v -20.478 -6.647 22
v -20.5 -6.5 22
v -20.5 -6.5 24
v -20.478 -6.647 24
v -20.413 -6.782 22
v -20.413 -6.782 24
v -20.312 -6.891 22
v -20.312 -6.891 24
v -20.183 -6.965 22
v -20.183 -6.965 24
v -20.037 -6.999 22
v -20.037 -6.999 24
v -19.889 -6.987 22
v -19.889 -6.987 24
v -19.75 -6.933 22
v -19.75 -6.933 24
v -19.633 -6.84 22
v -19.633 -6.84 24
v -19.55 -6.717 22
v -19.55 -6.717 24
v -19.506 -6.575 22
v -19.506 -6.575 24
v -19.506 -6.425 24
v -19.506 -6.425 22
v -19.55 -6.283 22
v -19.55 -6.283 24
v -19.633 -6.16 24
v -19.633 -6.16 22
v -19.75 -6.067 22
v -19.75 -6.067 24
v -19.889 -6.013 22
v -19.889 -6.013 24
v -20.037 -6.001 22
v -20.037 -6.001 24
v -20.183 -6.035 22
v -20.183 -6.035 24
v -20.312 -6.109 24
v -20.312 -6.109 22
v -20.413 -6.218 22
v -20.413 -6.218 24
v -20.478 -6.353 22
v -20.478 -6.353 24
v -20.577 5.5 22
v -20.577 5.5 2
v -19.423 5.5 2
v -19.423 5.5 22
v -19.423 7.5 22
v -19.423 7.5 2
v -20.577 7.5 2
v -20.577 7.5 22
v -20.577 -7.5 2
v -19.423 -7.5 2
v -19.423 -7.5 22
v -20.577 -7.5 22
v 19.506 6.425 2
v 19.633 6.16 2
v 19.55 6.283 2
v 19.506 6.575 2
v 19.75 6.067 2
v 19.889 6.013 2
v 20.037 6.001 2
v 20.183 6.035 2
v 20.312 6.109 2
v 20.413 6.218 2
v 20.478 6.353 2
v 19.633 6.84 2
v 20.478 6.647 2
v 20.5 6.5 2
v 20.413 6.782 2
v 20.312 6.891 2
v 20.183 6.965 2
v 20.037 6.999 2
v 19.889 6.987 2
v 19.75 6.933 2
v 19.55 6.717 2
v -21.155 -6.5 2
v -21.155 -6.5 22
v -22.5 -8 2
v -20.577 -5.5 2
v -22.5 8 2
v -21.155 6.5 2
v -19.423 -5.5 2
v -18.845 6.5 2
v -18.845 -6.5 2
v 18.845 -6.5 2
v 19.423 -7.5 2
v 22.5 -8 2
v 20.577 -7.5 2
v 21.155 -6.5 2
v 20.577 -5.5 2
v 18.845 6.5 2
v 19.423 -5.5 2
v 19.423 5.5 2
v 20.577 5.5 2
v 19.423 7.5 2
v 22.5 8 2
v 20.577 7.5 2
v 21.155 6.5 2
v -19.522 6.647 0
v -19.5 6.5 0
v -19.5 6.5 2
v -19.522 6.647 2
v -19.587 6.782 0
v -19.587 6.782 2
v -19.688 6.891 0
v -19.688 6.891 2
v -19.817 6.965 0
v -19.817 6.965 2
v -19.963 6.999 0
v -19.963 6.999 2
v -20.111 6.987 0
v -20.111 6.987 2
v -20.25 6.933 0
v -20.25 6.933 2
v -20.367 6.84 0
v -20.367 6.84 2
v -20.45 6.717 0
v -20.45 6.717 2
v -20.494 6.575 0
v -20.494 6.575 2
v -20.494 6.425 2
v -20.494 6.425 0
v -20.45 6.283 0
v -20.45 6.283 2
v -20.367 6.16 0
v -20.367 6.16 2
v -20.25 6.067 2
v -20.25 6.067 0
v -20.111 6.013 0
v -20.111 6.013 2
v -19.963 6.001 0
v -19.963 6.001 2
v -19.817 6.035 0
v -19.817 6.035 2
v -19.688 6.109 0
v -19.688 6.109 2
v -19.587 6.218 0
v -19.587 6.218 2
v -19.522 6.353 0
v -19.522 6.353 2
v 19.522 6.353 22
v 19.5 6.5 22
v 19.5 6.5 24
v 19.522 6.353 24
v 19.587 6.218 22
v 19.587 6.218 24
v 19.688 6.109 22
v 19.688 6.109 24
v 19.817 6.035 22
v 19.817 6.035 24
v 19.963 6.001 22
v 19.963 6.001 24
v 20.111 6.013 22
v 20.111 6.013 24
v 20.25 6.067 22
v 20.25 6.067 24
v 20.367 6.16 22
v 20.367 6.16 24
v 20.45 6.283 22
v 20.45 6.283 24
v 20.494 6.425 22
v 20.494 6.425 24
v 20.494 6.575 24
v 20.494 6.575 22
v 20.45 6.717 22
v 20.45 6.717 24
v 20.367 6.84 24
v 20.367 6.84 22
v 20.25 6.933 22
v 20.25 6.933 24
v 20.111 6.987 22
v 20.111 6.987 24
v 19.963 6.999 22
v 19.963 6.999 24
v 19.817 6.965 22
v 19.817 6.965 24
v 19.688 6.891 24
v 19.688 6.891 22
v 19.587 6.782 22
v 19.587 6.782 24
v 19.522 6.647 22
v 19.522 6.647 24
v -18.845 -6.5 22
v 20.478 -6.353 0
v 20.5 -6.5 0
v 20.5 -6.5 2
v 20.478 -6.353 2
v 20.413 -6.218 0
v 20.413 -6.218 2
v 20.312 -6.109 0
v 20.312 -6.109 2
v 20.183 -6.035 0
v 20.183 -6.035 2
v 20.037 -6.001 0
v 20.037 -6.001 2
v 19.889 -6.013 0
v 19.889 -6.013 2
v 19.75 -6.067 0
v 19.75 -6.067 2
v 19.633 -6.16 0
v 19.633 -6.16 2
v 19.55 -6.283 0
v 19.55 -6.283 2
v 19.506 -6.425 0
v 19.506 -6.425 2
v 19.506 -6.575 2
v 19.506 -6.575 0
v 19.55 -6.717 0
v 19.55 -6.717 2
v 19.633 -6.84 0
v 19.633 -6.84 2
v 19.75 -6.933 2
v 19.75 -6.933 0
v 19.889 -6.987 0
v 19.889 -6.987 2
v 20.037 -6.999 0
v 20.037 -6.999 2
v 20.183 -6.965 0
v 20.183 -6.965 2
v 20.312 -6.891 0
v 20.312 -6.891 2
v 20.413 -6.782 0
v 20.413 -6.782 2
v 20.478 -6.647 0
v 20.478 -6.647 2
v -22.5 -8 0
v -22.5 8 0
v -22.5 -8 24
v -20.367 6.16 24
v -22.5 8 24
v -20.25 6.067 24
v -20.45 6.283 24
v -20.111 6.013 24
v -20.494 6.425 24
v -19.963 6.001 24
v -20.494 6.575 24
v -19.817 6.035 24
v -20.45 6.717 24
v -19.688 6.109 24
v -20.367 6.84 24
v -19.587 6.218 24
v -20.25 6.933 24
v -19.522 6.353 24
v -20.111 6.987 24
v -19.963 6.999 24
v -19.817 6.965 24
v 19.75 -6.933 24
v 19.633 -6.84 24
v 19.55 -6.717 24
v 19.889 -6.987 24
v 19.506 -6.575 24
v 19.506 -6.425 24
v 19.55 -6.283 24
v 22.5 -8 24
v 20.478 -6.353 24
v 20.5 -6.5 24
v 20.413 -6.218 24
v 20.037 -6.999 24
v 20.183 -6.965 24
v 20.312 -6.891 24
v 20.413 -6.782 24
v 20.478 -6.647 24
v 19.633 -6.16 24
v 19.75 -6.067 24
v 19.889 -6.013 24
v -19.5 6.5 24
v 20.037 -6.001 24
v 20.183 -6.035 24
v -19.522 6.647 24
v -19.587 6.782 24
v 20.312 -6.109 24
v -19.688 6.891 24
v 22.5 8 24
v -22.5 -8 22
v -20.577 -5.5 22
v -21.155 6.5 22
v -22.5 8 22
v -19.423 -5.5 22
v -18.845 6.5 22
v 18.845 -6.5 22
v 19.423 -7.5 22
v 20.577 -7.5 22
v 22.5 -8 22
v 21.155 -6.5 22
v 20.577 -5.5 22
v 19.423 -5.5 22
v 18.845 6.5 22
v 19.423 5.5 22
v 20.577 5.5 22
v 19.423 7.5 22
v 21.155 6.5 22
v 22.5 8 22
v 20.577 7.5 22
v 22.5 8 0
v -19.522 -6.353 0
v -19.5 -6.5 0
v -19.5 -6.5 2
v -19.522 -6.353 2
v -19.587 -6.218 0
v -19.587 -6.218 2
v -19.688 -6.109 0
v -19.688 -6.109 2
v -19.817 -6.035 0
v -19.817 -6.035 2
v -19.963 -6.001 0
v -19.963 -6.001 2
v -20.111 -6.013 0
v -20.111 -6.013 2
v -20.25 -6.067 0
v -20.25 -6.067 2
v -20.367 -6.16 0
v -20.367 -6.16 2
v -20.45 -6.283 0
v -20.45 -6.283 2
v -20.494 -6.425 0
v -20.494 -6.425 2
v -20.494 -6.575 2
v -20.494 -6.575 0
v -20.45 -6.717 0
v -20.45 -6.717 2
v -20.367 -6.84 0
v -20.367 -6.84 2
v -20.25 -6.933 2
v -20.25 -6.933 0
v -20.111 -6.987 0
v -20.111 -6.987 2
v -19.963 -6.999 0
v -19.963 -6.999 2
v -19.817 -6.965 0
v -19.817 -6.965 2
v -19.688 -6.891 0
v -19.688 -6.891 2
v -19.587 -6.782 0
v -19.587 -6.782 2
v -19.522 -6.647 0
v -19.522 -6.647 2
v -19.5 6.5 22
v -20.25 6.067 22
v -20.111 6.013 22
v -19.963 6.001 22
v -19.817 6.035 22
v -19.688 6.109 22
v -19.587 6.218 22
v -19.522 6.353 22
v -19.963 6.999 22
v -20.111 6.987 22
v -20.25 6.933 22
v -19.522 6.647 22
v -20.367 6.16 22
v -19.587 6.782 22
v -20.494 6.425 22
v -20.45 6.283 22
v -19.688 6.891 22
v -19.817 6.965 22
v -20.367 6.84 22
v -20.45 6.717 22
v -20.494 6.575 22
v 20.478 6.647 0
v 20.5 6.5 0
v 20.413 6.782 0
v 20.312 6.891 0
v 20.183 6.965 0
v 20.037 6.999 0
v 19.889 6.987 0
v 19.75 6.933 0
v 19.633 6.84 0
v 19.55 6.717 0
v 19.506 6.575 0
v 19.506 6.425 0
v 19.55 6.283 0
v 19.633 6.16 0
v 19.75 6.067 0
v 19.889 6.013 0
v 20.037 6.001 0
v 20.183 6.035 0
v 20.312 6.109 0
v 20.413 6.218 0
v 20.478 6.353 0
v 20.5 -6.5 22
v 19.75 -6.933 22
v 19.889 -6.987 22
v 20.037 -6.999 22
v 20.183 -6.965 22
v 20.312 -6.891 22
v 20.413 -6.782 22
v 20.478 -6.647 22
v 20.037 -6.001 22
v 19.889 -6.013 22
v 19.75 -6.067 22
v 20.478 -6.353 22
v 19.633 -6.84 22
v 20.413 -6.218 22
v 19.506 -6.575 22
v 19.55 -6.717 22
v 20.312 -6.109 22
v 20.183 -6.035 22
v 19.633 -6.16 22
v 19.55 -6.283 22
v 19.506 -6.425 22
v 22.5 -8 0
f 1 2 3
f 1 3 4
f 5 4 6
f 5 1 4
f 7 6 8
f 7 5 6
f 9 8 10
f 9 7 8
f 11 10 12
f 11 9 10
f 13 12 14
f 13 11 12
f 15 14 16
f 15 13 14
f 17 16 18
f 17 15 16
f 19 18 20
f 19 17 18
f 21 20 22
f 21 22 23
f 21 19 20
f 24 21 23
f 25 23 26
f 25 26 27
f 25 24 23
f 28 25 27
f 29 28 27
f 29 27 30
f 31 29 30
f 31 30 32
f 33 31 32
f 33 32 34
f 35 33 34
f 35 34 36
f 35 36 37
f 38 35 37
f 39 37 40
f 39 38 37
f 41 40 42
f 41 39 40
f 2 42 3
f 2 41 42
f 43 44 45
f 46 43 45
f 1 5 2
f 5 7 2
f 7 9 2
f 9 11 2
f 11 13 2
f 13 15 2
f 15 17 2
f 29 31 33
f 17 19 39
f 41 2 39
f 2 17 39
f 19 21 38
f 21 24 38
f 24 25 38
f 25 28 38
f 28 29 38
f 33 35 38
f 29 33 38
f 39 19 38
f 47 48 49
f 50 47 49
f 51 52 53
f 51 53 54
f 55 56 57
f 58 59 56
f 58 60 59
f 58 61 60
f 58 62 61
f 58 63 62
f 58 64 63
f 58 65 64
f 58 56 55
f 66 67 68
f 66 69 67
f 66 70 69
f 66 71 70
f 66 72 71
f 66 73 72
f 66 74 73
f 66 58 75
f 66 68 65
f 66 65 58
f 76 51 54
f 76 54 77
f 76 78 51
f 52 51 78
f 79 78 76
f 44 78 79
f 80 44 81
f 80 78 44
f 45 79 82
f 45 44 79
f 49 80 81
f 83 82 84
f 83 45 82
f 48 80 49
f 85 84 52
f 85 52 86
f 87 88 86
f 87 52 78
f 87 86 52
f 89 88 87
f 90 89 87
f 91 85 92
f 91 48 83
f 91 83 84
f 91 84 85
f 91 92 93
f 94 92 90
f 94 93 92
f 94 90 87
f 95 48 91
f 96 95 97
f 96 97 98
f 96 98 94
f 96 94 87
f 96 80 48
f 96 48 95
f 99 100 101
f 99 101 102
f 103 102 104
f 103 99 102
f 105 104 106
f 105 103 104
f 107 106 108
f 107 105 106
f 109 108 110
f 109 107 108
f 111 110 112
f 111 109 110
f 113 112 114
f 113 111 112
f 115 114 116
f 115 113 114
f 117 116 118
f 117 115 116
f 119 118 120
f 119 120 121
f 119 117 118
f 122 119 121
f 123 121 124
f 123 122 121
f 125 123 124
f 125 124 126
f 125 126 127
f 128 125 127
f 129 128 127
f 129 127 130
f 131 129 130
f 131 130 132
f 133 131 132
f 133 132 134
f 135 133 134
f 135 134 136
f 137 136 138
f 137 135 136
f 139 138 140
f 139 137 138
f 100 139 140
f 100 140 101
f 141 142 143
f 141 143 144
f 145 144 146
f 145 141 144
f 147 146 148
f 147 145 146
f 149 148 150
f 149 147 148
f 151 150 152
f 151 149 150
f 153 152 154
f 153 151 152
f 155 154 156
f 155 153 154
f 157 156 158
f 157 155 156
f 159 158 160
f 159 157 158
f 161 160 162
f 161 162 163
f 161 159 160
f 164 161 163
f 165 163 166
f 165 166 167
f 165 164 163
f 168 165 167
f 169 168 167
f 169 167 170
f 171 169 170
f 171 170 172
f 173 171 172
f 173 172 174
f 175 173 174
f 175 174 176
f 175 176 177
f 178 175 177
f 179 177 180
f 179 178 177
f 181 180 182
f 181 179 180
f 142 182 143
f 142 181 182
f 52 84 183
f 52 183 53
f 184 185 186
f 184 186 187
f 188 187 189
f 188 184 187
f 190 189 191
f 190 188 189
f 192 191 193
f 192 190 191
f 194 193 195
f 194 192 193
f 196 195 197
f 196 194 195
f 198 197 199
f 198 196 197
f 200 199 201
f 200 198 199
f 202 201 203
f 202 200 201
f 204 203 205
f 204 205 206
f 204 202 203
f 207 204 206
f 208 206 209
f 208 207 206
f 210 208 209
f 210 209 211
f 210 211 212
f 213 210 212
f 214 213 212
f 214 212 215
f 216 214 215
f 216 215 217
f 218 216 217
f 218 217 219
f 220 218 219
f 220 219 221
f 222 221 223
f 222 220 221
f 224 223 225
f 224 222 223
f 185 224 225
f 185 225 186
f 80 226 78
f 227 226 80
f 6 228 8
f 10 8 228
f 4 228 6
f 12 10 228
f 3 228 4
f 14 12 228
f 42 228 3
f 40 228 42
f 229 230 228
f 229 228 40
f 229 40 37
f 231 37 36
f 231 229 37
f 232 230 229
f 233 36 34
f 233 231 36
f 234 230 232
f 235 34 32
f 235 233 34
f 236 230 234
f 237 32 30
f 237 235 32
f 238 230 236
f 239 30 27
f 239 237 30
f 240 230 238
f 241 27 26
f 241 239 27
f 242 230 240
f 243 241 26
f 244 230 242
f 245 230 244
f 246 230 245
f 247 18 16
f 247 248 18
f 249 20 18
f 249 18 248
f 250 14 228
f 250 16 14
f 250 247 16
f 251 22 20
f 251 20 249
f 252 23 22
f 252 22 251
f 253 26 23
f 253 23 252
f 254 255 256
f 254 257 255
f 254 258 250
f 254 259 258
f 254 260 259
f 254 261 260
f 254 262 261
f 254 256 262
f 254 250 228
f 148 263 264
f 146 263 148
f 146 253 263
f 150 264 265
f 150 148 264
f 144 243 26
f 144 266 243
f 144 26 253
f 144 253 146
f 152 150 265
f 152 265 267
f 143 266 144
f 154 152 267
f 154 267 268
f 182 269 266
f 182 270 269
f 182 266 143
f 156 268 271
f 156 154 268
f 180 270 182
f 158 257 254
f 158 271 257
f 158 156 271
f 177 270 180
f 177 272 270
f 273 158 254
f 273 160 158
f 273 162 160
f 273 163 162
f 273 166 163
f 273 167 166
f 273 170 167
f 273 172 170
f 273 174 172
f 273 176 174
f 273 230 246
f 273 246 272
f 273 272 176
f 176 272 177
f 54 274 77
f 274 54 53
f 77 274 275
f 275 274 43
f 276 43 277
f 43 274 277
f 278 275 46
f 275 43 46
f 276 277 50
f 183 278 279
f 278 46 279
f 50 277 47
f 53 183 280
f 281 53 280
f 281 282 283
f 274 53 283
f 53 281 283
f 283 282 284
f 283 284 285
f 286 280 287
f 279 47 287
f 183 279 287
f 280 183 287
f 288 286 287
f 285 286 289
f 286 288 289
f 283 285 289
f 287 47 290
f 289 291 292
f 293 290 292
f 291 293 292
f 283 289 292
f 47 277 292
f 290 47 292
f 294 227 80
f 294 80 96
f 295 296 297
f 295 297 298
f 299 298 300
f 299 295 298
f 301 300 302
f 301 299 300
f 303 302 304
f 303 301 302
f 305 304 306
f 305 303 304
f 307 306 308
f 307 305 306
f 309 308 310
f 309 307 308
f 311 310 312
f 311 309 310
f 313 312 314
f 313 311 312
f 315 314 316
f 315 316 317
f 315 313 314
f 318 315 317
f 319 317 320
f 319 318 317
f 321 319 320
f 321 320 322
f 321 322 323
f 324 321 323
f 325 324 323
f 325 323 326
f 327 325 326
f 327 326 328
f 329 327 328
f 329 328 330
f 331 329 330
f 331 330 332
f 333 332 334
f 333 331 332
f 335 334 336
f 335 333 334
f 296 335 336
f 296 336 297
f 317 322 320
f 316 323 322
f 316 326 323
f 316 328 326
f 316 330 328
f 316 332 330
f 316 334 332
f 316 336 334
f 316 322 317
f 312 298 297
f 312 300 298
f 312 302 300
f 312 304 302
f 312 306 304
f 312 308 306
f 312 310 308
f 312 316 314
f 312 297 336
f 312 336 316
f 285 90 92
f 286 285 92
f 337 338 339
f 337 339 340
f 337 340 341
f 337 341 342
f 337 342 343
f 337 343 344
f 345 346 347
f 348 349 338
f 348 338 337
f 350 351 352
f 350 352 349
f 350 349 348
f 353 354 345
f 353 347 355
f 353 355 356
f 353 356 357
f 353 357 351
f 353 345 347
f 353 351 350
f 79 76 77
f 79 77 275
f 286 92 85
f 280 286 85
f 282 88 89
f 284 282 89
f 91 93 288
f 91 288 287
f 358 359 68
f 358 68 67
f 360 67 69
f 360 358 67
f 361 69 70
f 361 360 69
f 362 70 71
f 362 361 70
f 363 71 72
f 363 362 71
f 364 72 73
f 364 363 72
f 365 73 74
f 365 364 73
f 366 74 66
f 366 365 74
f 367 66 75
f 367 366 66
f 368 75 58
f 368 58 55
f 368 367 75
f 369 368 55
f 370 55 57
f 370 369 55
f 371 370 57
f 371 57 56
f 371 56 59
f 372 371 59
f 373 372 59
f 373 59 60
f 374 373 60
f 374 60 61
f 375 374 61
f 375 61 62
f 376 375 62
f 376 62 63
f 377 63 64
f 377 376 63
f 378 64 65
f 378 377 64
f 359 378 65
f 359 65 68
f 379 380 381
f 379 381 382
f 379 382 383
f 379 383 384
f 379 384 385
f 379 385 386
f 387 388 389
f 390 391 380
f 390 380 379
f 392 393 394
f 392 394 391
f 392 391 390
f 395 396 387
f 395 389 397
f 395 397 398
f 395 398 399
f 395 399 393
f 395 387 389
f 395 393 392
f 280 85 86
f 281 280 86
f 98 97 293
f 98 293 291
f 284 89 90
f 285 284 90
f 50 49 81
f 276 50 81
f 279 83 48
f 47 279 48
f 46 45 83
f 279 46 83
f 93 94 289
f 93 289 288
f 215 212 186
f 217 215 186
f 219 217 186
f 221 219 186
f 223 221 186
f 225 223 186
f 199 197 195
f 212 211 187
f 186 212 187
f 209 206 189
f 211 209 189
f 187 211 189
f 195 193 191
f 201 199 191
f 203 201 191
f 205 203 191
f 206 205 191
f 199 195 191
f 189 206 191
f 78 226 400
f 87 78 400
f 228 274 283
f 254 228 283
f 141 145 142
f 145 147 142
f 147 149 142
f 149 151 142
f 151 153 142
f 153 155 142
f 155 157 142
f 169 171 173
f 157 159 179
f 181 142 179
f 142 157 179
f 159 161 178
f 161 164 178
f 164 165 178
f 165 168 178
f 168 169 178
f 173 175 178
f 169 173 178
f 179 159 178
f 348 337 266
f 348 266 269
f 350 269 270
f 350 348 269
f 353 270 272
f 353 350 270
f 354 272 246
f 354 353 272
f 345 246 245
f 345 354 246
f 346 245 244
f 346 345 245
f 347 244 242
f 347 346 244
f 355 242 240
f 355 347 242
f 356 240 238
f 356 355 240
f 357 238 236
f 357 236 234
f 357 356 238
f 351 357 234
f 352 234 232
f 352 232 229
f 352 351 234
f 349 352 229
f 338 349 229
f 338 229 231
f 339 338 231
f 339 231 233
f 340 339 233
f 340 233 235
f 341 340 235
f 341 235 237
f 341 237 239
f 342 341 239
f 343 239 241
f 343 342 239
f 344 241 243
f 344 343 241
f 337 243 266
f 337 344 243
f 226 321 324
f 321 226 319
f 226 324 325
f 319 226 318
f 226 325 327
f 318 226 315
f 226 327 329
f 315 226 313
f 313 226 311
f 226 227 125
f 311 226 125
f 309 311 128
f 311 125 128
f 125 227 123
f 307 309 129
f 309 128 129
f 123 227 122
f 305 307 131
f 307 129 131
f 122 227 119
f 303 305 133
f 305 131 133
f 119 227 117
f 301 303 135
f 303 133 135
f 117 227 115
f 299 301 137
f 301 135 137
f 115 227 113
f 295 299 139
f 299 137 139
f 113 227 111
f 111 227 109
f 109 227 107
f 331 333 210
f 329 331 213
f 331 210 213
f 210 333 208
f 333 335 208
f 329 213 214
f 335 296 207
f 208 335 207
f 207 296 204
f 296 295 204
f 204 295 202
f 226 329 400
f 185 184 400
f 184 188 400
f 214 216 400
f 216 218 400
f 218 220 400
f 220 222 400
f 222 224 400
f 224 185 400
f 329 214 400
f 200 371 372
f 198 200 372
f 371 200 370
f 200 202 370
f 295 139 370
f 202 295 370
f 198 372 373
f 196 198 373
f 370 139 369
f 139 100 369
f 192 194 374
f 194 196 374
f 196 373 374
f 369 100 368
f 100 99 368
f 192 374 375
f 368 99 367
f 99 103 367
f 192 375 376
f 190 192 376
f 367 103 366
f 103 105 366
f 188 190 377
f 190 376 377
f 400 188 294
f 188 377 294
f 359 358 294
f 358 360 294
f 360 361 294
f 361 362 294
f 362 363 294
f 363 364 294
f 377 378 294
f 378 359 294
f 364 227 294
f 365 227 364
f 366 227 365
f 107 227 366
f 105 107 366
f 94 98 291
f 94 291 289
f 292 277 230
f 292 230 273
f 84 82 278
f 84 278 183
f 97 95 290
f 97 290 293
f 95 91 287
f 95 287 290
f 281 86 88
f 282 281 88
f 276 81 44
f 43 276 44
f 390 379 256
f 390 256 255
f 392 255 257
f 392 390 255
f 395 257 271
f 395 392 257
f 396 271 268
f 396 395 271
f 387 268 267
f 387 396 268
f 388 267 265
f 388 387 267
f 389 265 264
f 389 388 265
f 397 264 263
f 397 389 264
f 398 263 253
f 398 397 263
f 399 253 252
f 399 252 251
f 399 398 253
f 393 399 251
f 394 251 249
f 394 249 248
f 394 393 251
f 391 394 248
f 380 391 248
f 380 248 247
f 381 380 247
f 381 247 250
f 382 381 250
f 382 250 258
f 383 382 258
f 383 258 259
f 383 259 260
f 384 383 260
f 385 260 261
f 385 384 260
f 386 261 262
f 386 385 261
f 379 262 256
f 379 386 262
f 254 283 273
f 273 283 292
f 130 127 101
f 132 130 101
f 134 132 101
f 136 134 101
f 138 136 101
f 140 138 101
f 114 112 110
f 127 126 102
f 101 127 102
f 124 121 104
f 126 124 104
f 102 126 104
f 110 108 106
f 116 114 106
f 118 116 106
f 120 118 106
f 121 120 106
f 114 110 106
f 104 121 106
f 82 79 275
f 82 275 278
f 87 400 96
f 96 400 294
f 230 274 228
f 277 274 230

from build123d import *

# Parameters (mm, degrees)
SKETCH_1_W      = 45
SKETCH_1_H      = 16
SKETCH_1_R      = 0.5
EXTRUDE_1_DEPTH = 2
EXTRUDE_2_DEPTH = 20
SKETCH_3_W      = 45
SKETCH_3_H      = 16
SKETCH_3_R      = 0.5
EXTRUDE_3_DEPTH = 2


with BuildPart() as part:
    # 草图1 → 凸台-拉伸1 (new body)
    with BuildSketch(Plane.XY):
        Rectangle(SKETCH_1_W, SKETCH_1_H)
        with Locations((-20, -6.5)):
            Circle(SKETCH_1_R, mode=Mode.SUBTRACT)
        with Locations((-20, 6.5)):
            Circle(SKETCH_1_R, mode=Mode.SUBTRACT)
        with Locations((20, 6.5)):
            Circle(SKETCH_1_R, mode=Mode.SUBTRACT)
        with Locations((20, -6.5)):
            Circle(SKETCH_1_R, mode=Mode.SUBTRACT)
    extrude(amount=EXTRUDE_1_DEPTH)

    # 草图2 → 凸台-拉伸2 (add)
    with BuildSketch(Plane.XY.offset(2)):
        Polygon((-18.845299462, 6.5), (-19.422649731, 7.5), (-20.577350269, 7.5), (-21.154700538, 6.5), (-20.577350269, 5.5), (-19.422649731, 5.5), align=None)
        Polygon((19.422649731, 5.5), (18.845299462, 6.5), (19.422649731, 7.5), (20.577350269, 7.5), (21.154700538, 6.5), (20.577350269, 5.5), align=None)
        Polygon((18.845299462, -6.5), (19.422649731, -7.5), (20.577350269, -7.5), (21.154700538, -6.5), (20.577350269, -5.5), (19.422649731, -5.5), align=None)
        Polygon((-19.422649731, -5.5), (-18.845299462, -6.5), (-19.422649731, -7.5), (-20.577350269, -7.5), (-21.154700538, -6.5), (-20.577350269, -5.5), align=None)
    extrude(amount=EXTRUDE_2_DEPTH)

    # 草图3 → 凸台-拉伸3 (add)
    with BuildSketch(Plane.XY.offset(22)):
        Rectangle(SKETCH_3_W, SKETCH_3_H)
        with Locations(Location((20, 6.5, 0), (0, 0, 180))):
            Circle(SKETCH_3_R, mode=Mode.SUBTRACT)
        with Locations(Location((-20, -6.5, 0), (0, 0, 180))):
            Circle(SKETCH_3_R, mode=Mode.SUBTRACT)
        with Locations((-20, 6.5)):
            Circle(SKETCH_3_R, mode=Mode.SUBTRACT)
        with Locations((20, -6.5)):
            Circle(SKETCH_3_R, mode=Mode.SUBTRACT)
    extrude(amount=EXTRUDE_3_DEPTH)


solid = part.part
